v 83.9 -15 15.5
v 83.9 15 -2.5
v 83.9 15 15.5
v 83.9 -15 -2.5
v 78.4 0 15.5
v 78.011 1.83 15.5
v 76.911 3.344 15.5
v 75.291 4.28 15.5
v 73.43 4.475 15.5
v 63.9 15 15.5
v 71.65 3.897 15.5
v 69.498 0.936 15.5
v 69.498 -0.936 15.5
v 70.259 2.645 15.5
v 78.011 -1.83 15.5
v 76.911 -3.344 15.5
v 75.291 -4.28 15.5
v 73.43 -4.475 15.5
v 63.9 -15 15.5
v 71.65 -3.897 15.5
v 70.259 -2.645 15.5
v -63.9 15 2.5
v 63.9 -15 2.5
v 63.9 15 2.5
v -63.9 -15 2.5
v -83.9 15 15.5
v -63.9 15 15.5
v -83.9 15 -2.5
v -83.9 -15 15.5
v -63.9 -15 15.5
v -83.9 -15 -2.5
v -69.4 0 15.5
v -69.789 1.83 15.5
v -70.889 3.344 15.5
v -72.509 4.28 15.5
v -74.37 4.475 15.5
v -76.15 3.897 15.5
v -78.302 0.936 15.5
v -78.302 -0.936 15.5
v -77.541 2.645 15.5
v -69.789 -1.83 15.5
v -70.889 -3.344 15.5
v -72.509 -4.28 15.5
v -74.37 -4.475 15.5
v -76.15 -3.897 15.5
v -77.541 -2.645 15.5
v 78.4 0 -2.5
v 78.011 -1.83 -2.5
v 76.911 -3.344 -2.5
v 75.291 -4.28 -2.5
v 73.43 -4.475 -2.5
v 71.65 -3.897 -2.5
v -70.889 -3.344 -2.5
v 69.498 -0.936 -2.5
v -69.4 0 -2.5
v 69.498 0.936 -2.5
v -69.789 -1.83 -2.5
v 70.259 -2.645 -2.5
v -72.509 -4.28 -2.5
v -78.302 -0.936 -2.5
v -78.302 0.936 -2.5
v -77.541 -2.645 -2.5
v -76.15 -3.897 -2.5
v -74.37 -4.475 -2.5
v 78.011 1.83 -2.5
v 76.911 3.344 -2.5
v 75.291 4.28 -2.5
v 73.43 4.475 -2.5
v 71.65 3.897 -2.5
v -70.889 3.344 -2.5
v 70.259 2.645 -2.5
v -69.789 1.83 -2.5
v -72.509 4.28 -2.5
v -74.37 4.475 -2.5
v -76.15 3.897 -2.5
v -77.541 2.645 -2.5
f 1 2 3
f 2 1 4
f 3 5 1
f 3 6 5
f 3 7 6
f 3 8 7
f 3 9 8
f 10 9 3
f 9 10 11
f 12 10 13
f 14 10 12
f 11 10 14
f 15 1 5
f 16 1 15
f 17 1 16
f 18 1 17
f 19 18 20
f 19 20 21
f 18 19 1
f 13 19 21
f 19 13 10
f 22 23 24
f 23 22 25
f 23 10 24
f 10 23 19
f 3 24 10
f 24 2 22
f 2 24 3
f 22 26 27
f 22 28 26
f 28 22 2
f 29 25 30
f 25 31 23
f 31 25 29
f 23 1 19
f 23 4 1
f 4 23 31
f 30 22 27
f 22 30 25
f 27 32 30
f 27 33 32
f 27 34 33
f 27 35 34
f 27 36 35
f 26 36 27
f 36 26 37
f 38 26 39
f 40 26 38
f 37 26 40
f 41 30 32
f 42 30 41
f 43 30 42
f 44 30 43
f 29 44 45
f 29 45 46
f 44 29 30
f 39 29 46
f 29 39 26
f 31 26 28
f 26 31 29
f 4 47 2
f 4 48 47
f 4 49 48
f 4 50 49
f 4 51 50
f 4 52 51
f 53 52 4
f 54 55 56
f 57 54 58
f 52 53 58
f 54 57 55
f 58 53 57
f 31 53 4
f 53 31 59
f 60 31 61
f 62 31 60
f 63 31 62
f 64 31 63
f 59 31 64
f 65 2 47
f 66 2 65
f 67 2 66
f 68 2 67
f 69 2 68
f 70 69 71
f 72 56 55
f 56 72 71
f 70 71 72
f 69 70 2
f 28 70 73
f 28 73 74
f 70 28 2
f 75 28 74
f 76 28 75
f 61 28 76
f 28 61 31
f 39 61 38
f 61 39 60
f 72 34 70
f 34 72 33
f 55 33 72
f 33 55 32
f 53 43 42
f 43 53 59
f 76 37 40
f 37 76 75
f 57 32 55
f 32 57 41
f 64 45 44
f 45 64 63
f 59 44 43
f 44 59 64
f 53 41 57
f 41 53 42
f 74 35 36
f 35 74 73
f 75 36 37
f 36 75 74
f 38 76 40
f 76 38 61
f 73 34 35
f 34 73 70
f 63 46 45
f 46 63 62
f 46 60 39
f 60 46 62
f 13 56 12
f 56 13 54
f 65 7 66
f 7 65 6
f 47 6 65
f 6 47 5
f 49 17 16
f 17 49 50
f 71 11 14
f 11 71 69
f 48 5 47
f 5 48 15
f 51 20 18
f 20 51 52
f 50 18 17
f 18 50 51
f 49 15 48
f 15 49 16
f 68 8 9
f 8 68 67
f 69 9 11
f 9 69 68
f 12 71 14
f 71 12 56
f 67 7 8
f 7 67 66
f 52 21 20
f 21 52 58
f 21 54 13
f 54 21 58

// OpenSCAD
// con * ocultamos el objeto
// con la ! mostramos solo ese objeto
// con la # vemos las piezas que se restan del objeto


difference(){
    union(){
        //cuerpo
        color("blue")
        cube([167.8,30,5],center=true);
        //torre derecha
        color("green"){
            translate([167.8/2-20/2,0,13/2+5/2])
                cube([20,30,13],center=true);
            //torre izquierda
            translate([-167.8/2+20/2,0,13/2+5/2])
                cube([20,30,13],center=true);
        }
    }
    
    //taladros
    #translate([-167.8/2+10,0,0])
        cylinder(r=9/2,h=50,center=true);
    
    #translate([167.8/2-10,0,0])
        cylinder(r=9/2,h=50,center=true);
    
}
